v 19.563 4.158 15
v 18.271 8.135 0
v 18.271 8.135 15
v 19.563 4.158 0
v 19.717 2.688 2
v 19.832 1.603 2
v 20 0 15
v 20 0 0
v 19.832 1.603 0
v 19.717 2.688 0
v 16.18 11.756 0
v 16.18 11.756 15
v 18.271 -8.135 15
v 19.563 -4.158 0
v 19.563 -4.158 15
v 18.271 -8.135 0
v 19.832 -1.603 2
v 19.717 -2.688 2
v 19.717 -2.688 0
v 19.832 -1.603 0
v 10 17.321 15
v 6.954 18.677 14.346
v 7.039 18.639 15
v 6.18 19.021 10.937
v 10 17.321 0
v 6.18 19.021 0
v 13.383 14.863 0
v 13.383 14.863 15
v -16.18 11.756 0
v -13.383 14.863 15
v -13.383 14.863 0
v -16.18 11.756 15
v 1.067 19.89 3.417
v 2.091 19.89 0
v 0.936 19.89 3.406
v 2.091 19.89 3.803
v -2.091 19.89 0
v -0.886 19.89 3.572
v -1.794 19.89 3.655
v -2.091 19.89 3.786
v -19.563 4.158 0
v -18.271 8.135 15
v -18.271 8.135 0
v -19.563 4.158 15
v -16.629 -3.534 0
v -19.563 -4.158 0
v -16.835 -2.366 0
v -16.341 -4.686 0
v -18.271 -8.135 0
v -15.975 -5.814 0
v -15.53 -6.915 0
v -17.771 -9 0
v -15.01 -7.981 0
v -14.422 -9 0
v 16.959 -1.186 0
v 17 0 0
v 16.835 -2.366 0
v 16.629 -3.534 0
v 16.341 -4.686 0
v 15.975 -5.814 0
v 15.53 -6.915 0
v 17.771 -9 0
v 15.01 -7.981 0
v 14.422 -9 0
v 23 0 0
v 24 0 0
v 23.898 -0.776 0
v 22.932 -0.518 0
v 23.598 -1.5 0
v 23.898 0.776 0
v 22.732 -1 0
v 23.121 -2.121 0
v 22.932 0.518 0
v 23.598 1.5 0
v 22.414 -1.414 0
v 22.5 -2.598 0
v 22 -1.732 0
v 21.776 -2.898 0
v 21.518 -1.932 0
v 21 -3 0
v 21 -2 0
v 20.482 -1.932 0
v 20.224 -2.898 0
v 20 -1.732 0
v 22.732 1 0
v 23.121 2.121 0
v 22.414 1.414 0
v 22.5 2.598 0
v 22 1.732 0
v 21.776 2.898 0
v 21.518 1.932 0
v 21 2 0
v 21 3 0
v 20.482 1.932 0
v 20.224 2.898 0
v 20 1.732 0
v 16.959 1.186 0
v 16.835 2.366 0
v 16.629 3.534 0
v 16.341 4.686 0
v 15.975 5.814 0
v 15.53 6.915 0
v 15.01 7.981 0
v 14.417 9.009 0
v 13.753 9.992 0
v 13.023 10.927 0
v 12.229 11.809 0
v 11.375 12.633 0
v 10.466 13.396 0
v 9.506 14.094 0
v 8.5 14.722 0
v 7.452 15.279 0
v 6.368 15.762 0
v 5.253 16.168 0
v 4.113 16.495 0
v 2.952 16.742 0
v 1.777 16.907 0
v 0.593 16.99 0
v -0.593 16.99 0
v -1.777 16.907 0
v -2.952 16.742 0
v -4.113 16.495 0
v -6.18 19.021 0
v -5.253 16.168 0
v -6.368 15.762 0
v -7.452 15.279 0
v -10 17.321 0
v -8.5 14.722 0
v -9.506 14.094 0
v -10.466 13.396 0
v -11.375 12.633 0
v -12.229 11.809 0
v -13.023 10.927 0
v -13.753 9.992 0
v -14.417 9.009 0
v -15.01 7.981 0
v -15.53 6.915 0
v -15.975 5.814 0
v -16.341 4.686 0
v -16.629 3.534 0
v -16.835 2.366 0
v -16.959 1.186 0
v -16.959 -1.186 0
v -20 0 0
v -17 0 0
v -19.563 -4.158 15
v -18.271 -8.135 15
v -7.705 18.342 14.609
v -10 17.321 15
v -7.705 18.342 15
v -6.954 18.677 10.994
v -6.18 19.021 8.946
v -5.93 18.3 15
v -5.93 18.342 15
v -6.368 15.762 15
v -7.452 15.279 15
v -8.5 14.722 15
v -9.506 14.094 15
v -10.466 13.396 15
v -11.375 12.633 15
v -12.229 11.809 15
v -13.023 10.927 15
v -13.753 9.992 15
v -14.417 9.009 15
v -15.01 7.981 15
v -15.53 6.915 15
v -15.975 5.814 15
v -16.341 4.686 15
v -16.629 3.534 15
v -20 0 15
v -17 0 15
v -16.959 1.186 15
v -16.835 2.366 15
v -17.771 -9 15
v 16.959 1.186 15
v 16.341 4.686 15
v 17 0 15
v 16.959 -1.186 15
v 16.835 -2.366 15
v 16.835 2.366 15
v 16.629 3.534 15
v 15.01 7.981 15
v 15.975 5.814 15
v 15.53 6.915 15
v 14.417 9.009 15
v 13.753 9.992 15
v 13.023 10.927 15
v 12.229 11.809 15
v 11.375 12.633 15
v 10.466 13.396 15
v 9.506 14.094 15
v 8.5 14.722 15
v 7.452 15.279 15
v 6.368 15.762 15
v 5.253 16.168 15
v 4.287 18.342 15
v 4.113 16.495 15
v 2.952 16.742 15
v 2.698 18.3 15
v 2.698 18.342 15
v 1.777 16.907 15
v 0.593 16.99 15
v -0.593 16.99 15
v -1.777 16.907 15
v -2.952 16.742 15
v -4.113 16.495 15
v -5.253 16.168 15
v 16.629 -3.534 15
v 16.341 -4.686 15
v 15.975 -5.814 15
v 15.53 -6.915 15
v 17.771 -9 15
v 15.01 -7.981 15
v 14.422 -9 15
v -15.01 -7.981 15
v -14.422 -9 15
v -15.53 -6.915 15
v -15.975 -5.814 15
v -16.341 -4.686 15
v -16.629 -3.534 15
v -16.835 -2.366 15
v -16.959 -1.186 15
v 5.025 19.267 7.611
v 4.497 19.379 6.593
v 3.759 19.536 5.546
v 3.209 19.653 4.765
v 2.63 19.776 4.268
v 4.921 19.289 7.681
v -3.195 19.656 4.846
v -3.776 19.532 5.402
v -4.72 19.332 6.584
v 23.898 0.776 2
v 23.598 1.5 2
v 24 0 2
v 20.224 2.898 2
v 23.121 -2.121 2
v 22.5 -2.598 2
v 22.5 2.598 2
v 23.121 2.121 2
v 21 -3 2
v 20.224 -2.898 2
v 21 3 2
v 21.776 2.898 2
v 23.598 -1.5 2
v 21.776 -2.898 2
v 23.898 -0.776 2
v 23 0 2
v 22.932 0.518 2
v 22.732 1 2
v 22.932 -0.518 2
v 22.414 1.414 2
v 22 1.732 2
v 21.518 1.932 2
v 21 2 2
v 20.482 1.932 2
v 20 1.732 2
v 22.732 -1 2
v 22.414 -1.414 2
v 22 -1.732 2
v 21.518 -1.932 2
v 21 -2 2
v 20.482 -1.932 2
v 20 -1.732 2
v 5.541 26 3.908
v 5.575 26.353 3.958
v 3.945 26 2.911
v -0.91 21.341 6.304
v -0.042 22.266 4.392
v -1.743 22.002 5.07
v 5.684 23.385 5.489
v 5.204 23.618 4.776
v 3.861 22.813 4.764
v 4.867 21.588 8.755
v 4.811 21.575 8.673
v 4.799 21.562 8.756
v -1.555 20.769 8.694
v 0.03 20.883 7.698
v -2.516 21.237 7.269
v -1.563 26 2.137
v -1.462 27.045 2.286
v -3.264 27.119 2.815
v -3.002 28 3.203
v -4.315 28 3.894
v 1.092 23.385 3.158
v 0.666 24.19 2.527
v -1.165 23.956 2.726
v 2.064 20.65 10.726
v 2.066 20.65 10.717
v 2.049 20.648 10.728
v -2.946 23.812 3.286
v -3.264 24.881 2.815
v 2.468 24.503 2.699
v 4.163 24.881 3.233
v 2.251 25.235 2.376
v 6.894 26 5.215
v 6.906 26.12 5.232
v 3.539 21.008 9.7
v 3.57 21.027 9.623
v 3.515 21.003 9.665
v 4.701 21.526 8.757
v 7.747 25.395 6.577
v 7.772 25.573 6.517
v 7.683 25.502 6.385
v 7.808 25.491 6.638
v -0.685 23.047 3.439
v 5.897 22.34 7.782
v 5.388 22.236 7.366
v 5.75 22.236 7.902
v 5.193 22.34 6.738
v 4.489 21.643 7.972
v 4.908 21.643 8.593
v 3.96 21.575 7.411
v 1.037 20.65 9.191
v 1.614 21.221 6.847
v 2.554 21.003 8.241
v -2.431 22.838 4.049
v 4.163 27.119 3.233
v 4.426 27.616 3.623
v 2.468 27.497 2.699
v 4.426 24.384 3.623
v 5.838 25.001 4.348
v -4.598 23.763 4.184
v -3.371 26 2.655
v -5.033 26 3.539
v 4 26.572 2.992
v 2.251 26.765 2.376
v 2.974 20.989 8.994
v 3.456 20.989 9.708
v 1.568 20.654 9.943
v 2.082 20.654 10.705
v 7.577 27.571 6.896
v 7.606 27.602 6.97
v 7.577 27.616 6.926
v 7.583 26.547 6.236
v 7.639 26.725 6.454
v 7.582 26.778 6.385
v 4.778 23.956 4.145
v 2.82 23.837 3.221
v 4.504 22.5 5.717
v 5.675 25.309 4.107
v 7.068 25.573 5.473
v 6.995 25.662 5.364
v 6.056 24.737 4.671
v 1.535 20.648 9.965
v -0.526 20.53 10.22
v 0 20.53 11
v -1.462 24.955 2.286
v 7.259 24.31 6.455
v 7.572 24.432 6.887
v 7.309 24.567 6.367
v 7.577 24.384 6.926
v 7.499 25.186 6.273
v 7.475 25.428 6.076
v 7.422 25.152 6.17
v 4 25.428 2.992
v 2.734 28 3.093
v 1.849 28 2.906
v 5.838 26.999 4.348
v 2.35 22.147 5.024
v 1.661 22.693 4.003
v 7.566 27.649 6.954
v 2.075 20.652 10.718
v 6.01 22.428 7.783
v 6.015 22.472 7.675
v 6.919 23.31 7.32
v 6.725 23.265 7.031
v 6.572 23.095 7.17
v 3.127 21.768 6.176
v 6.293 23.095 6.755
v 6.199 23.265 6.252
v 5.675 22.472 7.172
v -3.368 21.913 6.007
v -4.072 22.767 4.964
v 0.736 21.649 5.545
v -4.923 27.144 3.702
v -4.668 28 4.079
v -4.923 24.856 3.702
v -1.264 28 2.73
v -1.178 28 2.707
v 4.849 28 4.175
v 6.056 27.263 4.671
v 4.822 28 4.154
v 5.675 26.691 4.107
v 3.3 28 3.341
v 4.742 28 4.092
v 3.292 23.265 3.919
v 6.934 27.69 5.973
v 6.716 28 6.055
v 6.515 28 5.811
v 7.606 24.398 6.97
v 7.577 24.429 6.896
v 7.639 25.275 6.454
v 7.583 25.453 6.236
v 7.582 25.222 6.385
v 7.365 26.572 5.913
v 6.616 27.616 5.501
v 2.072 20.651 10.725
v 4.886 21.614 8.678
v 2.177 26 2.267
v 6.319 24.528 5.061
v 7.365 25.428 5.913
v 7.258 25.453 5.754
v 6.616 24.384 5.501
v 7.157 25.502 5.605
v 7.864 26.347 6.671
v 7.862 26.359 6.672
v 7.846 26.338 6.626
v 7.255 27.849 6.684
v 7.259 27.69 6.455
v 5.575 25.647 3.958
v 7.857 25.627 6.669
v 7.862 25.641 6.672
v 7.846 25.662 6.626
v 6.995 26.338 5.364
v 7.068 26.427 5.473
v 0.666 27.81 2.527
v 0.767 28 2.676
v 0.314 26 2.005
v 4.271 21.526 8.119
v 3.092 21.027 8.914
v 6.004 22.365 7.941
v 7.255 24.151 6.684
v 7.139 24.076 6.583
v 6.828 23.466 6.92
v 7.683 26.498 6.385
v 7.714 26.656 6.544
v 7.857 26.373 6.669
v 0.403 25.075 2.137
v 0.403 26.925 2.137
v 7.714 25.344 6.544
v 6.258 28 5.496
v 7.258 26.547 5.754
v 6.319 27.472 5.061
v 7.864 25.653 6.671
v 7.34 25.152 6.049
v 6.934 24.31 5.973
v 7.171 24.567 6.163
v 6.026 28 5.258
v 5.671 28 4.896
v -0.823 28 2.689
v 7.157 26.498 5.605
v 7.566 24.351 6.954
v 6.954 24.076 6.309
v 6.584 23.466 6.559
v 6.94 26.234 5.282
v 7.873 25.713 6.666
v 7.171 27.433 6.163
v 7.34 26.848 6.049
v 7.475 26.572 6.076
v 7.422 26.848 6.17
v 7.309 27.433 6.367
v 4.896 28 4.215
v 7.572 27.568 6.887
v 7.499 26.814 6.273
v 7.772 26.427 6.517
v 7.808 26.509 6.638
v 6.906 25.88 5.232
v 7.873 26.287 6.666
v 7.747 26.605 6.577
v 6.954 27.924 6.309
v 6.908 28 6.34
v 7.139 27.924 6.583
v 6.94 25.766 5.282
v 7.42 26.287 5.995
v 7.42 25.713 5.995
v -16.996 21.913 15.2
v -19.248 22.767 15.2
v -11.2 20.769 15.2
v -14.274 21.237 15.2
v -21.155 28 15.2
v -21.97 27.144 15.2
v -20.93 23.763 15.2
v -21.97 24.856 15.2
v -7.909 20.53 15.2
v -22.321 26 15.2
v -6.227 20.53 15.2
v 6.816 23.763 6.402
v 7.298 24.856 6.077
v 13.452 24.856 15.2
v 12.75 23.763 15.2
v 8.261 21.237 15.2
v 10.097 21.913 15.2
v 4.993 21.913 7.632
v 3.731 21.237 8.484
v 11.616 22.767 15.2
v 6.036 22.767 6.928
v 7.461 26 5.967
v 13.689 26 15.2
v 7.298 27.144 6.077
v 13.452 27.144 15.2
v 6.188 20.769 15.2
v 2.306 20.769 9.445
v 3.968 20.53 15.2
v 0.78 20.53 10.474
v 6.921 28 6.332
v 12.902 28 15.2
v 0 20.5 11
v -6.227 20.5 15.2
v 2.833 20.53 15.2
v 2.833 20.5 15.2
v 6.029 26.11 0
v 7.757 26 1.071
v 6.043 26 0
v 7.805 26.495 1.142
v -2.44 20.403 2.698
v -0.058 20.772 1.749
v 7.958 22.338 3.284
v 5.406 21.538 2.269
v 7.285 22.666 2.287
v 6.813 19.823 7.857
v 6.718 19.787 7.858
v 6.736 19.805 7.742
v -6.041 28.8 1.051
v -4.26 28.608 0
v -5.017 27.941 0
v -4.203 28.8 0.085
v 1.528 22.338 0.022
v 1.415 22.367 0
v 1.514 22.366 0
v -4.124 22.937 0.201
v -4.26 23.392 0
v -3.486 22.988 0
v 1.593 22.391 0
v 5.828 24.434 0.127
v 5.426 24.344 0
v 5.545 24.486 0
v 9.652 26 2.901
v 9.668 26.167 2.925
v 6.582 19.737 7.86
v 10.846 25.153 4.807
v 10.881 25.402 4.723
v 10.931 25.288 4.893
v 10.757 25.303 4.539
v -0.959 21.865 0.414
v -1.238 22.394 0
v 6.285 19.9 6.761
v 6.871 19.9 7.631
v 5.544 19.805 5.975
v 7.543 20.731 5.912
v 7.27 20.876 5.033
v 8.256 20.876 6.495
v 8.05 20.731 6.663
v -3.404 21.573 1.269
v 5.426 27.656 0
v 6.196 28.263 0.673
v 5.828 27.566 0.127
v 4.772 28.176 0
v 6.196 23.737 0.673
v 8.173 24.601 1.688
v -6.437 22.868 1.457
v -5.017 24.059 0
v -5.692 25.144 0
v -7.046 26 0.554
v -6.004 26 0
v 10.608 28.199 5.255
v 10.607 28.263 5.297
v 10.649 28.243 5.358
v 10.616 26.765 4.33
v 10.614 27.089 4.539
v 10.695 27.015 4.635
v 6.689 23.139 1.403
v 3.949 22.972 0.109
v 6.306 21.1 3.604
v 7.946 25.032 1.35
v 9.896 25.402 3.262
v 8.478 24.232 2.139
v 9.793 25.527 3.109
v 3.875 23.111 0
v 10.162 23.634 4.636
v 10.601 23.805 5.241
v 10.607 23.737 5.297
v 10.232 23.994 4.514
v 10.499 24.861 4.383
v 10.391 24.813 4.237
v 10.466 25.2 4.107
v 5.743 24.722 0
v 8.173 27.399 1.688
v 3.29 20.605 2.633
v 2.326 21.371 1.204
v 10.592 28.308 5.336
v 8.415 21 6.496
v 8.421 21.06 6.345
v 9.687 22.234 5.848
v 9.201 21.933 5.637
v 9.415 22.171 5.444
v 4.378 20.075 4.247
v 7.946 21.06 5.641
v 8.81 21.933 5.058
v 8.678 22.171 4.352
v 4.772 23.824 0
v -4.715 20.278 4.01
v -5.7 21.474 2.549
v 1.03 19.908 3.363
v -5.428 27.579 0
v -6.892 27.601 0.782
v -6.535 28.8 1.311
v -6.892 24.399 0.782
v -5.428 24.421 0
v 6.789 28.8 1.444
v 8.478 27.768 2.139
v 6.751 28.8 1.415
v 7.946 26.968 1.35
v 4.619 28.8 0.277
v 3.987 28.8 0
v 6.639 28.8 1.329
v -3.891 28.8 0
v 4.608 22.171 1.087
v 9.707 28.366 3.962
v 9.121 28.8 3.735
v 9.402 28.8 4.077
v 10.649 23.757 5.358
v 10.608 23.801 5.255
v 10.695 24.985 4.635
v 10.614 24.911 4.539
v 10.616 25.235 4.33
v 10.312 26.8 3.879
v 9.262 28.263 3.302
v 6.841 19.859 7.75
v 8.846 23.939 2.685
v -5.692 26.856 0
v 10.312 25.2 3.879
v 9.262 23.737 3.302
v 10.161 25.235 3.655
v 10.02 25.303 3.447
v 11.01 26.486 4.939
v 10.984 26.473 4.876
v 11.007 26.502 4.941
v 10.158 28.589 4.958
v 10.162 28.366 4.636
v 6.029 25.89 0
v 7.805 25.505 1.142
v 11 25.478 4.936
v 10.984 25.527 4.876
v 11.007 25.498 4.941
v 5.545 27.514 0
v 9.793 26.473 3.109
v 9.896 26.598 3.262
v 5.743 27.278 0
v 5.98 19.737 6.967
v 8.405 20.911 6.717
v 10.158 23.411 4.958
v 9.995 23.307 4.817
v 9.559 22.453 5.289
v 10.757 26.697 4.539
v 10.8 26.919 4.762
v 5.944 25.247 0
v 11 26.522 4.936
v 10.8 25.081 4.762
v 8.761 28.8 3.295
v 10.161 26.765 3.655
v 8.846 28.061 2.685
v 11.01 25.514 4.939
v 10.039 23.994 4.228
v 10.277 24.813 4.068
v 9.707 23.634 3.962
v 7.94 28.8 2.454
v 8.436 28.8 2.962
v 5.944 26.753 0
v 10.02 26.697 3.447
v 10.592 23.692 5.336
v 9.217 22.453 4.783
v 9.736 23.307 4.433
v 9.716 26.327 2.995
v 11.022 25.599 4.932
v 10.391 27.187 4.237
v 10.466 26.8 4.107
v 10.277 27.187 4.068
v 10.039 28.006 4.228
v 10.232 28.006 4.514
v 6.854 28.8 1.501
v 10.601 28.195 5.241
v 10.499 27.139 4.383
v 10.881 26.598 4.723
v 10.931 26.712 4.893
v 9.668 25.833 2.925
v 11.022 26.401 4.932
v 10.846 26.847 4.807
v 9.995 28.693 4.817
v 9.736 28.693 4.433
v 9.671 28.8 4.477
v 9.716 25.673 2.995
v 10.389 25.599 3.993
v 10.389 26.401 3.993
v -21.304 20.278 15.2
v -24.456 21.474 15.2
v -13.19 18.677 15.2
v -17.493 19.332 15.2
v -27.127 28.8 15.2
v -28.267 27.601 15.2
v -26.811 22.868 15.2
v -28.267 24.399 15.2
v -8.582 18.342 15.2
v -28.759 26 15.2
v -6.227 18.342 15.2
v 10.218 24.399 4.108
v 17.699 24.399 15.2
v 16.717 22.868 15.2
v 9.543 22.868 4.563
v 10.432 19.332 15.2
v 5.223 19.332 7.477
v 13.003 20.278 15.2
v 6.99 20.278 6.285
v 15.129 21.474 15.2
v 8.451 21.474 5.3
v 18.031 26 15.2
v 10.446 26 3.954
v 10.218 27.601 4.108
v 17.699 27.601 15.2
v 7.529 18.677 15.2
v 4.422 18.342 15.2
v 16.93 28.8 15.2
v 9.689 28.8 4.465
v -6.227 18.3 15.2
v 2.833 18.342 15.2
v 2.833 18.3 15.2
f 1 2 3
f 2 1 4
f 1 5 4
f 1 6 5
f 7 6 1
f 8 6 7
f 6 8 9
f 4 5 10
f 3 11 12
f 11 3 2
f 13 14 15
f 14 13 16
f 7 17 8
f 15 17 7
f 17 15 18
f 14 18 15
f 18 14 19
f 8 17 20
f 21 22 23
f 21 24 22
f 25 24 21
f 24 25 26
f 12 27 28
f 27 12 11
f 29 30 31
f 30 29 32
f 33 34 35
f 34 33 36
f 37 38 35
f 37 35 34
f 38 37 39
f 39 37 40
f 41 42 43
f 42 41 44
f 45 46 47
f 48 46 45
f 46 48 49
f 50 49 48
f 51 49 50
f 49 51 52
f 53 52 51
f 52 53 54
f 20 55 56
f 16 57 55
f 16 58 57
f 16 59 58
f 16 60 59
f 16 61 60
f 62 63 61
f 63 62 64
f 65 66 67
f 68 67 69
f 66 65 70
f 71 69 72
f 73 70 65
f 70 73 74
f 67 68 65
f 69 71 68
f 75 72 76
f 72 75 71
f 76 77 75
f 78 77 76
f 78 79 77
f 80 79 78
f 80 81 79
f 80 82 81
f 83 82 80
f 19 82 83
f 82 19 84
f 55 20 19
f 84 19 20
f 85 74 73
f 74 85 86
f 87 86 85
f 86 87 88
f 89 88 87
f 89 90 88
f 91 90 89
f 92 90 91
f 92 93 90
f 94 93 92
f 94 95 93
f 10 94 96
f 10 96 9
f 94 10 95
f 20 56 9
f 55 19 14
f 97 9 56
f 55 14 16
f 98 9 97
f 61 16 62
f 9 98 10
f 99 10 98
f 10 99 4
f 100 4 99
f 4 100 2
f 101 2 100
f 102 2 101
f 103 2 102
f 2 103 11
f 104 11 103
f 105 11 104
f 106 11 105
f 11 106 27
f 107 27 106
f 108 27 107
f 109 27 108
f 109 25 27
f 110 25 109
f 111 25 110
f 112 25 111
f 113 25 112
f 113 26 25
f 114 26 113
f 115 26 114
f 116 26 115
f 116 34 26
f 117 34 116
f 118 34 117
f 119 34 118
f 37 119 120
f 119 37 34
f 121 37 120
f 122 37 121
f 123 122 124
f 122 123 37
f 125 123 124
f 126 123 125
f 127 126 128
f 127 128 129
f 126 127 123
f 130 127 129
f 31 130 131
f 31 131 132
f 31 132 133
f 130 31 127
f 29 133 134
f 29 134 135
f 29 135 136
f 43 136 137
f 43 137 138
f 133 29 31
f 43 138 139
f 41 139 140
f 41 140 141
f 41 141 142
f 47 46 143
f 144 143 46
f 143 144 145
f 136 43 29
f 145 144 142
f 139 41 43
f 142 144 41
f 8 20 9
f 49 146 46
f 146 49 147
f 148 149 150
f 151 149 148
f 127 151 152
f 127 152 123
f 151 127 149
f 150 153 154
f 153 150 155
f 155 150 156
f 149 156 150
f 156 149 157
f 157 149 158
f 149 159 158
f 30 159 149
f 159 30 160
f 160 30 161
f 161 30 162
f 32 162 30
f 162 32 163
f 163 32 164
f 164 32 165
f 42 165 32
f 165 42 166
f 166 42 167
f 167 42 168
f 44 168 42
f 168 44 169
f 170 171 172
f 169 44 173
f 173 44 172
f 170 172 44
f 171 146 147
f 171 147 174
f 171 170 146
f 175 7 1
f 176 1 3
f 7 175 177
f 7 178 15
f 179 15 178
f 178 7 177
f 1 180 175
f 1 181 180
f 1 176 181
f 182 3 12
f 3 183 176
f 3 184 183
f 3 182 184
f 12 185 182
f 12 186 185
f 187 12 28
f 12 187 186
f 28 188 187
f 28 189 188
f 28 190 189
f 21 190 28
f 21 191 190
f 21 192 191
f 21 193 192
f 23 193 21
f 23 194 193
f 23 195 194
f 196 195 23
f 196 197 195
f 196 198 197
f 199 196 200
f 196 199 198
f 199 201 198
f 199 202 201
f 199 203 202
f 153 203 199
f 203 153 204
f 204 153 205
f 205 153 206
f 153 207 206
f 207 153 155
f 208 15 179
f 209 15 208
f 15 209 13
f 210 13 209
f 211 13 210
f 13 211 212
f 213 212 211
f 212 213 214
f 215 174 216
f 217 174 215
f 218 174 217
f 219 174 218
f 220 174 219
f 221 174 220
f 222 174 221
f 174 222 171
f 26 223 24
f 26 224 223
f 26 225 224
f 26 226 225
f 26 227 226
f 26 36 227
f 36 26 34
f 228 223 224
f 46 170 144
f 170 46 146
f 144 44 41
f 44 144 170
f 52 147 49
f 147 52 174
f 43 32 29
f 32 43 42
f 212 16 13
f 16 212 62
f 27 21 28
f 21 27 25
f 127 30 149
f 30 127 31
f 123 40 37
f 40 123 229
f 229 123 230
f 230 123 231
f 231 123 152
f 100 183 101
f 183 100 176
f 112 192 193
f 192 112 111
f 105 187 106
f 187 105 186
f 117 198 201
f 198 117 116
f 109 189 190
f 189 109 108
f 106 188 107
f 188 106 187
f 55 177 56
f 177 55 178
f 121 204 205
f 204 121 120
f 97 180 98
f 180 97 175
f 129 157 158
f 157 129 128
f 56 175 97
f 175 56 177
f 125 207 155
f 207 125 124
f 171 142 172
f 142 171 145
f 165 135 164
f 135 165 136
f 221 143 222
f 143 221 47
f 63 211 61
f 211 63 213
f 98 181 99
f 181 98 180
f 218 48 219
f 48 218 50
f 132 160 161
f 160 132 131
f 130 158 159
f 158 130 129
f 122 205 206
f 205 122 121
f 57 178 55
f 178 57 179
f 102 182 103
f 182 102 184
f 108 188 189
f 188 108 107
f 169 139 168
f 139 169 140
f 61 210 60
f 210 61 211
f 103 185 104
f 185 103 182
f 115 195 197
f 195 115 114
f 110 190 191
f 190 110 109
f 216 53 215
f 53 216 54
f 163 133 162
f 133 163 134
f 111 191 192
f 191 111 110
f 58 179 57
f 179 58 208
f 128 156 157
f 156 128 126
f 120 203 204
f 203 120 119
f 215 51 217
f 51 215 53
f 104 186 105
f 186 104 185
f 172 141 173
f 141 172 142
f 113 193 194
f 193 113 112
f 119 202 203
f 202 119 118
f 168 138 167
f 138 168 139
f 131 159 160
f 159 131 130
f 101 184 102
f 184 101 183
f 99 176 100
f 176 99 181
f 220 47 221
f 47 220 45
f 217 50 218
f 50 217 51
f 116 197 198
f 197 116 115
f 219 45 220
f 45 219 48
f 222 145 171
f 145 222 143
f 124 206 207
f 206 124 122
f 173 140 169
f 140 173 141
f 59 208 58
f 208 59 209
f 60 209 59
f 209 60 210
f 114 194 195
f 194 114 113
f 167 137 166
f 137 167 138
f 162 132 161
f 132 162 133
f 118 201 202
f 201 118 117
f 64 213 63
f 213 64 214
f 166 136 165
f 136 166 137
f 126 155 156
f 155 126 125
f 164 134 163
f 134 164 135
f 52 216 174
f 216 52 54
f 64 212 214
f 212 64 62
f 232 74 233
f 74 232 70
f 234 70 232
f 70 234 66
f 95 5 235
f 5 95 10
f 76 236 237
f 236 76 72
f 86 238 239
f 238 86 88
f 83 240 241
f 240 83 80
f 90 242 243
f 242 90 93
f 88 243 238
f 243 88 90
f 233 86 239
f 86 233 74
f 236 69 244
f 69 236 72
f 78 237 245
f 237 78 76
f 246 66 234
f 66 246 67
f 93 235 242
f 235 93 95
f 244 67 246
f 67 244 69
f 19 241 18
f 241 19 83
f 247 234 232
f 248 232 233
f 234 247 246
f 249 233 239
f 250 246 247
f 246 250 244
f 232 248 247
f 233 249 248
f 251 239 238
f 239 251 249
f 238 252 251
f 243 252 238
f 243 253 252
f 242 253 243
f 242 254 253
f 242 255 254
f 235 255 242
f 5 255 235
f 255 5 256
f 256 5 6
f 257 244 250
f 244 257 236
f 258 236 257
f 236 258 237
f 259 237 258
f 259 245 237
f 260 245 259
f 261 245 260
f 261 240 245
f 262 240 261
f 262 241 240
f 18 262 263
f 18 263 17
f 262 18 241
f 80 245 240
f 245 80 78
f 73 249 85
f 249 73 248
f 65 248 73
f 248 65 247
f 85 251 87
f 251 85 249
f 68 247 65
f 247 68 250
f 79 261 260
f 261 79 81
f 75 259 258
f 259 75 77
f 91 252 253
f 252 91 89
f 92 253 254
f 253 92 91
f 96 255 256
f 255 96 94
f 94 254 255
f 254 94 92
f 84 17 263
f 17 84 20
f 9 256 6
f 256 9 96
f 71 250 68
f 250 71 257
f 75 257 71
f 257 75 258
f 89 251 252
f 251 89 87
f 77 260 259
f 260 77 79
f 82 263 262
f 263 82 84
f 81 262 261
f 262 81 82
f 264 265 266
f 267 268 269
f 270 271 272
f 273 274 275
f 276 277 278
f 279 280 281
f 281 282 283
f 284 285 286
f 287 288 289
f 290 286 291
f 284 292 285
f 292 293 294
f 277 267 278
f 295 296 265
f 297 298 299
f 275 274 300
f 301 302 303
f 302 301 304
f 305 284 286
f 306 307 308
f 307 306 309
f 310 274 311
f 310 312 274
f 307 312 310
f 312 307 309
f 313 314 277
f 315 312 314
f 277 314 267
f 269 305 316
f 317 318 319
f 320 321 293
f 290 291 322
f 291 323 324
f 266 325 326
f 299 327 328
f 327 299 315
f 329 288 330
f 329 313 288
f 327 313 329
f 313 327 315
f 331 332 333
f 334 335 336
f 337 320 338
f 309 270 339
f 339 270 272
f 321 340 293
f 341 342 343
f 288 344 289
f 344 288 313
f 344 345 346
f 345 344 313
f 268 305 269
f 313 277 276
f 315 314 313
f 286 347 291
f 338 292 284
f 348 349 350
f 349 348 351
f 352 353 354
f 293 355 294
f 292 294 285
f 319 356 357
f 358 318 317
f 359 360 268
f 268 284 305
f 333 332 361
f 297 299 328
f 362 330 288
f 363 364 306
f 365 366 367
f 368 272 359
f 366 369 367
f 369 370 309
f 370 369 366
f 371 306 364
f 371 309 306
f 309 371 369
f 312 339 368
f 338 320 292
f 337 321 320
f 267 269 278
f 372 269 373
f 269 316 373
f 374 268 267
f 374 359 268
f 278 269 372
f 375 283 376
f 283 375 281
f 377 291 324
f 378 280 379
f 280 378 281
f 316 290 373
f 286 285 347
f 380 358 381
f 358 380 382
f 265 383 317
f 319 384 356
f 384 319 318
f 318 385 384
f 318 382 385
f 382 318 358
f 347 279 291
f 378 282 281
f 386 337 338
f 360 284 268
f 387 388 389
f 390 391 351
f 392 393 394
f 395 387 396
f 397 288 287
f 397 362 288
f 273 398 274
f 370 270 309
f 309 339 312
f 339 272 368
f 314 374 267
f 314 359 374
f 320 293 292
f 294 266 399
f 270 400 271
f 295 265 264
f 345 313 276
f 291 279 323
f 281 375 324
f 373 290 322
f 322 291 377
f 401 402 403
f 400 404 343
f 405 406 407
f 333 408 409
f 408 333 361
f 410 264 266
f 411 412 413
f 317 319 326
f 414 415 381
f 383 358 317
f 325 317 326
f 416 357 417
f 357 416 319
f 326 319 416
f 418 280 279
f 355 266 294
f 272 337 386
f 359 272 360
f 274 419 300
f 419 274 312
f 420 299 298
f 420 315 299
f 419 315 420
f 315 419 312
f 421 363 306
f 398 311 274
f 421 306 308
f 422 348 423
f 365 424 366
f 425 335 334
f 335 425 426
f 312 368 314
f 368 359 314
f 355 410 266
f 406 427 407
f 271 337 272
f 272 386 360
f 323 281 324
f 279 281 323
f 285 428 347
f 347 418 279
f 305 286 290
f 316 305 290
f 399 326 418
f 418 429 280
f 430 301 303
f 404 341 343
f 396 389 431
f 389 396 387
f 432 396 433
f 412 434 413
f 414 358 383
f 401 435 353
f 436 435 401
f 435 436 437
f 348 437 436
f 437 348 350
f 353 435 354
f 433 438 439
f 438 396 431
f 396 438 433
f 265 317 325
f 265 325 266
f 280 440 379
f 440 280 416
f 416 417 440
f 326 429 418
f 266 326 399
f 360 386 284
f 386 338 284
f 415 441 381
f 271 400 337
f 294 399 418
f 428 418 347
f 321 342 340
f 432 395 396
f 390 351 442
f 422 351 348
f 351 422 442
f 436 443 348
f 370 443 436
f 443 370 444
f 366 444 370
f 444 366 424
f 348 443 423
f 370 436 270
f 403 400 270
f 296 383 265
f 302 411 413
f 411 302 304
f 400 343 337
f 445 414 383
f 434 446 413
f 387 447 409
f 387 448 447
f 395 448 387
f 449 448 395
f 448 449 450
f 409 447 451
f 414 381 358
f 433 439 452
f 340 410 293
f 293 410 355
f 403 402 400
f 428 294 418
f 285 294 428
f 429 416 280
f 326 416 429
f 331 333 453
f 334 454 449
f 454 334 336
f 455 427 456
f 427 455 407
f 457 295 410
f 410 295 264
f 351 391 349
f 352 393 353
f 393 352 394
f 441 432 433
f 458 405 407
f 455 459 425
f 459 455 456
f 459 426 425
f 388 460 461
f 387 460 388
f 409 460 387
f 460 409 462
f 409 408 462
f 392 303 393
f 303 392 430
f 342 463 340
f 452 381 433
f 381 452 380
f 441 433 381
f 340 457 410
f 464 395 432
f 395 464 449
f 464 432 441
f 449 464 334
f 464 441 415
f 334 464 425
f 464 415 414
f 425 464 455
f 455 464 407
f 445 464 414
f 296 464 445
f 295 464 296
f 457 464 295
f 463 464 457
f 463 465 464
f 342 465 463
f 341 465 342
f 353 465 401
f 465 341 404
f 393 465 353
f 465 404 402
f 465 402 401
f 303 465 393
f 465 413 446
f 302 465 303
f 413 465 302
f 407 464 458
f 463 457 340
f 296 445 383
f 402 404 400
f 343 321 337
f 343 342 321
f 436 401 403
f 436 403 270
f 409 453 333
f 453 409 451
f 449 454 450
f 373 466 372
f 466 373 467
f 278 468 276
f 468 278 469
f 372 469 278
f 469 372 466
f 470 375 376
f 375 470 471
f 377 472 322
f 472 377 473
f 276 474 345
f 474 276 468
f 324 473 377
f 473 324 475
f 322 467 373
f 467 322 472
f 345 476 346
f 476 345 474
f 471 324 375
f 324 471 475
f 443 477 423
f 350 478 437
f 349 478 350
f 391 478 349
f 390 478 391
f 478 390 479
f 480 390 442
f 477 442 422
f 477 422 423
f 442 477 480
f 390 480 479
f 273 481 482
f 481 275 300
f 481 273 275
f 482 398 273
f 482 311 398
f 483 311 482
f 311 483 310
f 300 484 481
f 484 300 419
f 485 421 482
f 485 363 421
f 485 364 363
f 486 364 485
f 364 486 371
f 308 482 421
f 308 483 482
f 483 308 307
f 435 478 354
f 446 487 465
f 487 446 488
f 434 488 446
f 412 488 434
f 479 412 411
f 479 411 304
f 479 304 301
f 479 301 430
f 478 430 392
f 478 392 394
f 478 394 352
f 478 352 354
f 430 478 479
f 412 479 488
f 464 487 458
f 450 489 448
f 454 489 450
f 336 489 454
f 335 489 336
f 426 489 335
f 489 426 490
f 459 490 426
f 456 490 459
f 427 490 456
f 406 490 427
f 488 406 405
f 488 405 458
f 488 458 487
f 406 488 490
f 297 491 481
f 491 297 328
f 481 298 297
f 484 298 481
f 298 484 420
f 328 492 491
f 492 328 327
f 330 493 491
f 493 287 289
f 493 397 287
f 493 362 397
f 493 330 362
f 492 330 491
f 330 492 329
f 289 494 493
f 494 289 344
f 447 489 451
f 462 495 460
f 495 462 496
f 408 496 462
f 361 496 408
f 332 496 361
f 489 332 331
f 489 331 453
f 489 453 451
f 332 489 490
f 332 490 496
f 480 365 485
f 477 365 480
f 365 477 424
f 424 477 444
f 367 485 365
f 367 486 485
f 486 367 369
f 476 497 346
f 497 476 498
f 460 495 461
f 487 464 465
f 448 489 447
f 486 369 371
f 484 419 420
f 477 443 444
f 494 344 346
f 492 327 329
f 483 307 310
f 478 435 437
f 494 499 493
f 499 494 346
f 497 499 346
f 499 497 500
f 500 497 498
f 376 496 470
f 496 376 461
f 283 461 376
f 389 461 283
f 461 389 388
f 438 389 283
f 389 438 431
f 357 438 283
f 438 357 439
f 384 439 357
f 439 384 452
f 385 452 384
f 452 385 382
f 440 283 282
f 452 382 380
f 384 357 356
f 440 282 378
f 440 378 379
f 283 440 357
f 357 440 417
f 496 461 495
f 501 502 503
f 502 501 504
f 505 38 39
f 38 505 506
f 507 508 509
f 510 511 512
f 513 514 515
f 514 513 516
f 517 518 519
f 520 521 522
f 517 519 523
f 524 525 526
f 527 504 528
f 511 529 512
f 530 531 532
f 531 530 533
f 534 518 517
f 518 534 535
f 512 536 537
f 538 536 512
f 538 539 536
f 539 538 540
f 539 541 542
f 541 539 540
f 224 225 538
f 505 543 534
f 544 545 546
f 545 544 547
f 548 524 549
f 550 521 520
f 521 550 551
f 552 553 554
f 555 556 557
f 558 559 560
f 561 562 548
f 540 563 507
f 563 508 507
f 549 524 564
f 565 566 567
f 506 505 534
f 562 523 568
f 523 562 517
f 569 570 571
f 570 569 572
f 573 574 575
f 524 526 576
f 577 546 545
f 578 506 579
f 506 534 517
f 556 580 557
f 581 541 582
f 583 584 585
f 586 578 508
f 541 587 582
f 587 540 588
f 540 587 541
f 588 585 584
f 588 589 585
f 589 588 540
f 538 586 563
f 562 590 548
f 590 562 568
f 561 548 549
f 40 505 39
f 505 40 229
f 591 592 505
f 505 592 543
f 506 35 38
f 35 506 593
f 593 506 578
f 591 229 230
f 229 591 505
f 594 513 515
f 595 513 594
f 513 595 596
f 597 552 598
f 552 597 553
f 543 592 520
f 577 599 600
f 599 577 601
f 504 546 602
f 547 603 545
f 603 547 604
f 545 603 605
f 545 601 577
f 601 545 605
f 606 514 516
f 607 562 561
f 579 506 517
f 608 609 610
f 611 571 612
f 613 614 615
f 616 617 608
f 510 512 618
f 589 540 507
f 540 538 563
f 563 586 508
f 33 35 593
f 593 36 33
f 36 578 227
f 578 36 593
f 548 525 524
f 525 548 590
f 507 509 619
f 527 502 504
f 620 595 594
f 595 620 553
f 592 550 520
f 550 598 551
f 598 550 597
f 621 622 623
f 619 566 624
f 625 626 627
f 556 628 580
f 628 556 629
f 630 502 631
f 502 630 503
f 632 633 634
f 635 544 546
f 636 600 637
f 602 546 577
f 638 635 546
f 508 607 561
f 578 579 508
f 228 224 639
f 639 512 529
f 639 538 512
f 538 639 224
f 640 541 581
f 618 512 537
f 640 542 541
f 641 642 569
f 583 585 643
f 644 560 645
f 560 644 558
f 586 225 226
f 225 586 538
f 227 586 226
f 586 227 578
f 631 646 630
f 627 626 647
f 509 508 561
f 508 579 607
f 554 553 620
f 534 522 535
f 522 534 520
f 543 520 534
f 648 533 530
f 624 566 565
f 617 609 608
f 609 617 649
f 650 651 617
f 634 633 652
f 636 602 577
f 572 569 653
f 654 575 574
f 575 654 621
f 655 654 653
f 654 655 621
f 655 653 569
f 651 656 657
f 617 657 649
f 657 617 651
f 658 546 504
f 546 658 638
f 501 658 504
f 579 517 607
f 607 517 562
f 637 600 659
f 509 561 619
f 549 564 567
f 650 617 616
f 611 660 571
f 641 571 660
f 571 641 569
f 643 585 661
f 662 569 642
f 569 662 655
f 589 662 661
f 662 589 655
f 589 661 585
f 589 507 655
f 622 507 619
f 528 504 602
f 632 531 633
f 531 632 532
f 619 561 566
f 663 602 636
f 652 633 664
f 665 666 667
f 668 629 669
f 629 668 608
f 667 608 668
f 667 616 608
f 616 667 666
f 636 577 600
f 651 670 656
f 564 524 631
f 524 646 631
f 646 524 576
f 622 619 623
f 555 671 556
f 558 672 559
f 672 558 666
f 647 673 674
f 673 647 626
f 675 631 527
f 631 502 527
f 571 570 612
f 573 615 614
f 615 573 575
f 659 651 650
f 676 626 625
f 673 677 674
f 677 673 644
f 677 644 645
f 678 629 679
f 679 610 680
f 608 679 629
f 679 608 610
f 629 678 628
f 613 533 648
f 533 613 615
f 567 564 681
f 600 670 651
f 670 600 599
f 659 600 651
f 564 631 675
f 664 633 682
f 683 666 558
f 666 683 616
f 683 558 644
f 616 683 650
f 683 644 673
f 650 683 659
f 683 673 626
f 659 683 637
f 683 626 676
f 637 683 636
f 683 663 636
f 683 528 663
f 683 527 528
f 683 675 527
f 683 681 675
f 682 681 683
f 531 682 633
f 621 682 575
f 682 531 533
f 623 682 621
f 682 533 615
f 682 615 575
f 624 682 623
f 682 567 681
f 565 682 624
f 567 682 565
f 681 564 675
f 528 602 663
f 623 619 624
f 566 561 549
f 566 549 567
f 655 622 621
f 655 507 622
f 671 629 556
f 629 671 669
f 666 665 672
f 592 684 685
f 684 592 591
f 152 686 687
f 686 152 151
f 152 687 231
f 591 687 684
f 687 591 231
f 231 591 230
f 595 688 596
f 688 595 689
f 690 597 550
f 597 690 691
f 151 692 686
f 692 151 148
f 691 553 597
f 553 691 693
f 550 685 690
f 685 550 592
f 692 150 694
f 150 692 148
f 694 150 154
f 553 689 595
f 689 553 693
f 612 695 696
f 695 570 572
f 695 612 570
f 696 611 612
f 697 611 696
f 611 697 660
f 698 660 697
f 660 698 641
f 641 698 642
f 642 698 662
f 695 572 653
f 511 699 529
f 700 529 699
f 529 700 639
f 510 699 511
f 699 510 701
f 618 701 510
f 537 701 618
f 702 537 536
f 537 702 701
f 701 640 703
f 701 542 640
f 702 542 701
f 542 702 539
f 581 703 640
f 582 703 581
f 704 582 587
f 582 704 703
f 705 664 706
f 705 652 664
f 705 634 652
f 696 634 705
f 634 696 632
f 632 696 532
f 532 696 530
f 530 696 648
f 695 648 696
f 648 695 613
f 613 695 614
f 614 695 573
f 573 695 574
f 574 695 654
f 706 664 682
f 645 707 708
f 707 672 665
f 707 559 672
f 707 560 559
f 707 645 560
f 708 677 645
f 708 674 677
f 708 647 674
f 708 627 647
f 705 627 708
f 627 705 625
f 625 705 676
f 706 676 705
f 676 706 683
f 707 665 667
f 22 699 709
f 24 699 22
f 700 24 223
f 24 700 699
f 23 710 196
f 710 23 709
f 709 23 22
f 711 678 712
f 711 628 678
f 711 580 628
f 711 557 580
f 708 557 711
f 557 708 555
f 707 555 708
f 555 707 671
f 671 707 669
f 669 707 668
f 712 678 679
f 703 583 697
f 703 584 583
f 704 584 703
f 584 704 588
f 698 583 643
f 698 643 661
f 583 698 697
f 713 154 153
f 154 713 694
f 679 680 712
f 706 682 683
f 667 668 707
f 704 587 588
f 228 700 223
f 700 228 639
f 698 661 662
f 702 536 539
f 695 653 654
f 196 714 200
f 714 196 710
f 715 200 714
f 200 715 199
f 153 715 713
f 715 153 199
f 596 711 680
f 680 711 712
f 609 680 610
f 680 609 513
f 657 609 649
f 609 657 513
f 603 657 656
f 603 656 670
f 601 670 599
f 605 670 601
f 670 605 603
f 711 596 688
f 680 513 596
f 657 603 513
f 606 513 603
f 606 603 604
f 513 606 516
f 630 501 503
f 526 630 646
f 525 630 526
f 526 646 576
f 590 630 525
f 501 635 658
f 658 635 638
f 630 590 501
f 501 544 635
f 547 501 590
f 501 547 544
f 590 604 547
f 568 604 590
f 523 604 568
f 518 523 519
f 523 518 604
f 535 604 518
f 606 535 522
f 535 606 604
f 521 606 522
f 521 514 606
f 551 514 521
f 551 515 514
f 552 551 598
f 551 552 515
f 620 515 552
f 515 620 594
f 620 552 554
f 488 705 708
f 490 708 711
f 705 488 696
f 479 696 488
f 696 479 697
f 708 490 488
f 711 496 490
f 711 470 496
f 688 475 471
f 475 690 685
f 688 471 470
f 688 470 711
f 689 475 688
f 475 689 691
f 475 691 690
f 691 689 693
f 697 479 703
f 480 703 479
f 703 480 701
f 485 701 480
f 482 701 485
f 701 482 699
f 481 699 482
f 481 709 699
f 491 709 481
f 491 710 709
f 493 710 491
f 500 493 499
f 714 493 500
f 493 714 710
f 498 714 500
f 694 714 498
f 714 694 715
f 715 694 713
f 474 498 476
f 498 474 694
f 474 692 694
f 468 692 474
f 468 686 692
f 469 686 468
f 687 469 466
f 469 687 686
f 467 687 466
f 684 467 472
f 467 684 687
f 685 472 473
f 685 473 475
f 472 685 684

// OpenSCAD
r = 17;
dr = 3;
h = 15;

module clip () {
difference(){
    cylinder(h=h,r=r+dr);
    translate([0,0,-1]) cylinder(h=h+2,r=r,$fn=90);
    translate([0,-17-2,2]) cube([40,20,2*h+2],true);
}
translate([r+dr+1,0,0])
    difference() {
        cylinder(h=2,r=3,$fn=24);
        translate([0,0,-1])cylinder(h=4,r=2,$fn=24);
    }
}

module tablet () {
    difference() {
        scale(.5)scale([1.8,1.1,1.8]) {
            sphere(10);
            cylinder(30, r=10);
            rotate([0,90,0]) { cylinder(30, r=10); }
            translate([0,-10,0]) { cube([30,20,30]); }
        }
        translate([-20,2,-20]) { cube([80,15,80]); }
    }
}

module socket () {
    rotate([0,-56,0]) {
        difference() {
            scale(1.4) tablet();
            //translate([-12,-8,-12]) { cube([35,12,35]); }
            tablet();
        }
    }
}

clip();
difference() {
    translate([0,r+9,11]) socket();
    translate([-10,15,-20]) cube(20);
    translate([-40,0,h+0.2]) cube(80);
}
